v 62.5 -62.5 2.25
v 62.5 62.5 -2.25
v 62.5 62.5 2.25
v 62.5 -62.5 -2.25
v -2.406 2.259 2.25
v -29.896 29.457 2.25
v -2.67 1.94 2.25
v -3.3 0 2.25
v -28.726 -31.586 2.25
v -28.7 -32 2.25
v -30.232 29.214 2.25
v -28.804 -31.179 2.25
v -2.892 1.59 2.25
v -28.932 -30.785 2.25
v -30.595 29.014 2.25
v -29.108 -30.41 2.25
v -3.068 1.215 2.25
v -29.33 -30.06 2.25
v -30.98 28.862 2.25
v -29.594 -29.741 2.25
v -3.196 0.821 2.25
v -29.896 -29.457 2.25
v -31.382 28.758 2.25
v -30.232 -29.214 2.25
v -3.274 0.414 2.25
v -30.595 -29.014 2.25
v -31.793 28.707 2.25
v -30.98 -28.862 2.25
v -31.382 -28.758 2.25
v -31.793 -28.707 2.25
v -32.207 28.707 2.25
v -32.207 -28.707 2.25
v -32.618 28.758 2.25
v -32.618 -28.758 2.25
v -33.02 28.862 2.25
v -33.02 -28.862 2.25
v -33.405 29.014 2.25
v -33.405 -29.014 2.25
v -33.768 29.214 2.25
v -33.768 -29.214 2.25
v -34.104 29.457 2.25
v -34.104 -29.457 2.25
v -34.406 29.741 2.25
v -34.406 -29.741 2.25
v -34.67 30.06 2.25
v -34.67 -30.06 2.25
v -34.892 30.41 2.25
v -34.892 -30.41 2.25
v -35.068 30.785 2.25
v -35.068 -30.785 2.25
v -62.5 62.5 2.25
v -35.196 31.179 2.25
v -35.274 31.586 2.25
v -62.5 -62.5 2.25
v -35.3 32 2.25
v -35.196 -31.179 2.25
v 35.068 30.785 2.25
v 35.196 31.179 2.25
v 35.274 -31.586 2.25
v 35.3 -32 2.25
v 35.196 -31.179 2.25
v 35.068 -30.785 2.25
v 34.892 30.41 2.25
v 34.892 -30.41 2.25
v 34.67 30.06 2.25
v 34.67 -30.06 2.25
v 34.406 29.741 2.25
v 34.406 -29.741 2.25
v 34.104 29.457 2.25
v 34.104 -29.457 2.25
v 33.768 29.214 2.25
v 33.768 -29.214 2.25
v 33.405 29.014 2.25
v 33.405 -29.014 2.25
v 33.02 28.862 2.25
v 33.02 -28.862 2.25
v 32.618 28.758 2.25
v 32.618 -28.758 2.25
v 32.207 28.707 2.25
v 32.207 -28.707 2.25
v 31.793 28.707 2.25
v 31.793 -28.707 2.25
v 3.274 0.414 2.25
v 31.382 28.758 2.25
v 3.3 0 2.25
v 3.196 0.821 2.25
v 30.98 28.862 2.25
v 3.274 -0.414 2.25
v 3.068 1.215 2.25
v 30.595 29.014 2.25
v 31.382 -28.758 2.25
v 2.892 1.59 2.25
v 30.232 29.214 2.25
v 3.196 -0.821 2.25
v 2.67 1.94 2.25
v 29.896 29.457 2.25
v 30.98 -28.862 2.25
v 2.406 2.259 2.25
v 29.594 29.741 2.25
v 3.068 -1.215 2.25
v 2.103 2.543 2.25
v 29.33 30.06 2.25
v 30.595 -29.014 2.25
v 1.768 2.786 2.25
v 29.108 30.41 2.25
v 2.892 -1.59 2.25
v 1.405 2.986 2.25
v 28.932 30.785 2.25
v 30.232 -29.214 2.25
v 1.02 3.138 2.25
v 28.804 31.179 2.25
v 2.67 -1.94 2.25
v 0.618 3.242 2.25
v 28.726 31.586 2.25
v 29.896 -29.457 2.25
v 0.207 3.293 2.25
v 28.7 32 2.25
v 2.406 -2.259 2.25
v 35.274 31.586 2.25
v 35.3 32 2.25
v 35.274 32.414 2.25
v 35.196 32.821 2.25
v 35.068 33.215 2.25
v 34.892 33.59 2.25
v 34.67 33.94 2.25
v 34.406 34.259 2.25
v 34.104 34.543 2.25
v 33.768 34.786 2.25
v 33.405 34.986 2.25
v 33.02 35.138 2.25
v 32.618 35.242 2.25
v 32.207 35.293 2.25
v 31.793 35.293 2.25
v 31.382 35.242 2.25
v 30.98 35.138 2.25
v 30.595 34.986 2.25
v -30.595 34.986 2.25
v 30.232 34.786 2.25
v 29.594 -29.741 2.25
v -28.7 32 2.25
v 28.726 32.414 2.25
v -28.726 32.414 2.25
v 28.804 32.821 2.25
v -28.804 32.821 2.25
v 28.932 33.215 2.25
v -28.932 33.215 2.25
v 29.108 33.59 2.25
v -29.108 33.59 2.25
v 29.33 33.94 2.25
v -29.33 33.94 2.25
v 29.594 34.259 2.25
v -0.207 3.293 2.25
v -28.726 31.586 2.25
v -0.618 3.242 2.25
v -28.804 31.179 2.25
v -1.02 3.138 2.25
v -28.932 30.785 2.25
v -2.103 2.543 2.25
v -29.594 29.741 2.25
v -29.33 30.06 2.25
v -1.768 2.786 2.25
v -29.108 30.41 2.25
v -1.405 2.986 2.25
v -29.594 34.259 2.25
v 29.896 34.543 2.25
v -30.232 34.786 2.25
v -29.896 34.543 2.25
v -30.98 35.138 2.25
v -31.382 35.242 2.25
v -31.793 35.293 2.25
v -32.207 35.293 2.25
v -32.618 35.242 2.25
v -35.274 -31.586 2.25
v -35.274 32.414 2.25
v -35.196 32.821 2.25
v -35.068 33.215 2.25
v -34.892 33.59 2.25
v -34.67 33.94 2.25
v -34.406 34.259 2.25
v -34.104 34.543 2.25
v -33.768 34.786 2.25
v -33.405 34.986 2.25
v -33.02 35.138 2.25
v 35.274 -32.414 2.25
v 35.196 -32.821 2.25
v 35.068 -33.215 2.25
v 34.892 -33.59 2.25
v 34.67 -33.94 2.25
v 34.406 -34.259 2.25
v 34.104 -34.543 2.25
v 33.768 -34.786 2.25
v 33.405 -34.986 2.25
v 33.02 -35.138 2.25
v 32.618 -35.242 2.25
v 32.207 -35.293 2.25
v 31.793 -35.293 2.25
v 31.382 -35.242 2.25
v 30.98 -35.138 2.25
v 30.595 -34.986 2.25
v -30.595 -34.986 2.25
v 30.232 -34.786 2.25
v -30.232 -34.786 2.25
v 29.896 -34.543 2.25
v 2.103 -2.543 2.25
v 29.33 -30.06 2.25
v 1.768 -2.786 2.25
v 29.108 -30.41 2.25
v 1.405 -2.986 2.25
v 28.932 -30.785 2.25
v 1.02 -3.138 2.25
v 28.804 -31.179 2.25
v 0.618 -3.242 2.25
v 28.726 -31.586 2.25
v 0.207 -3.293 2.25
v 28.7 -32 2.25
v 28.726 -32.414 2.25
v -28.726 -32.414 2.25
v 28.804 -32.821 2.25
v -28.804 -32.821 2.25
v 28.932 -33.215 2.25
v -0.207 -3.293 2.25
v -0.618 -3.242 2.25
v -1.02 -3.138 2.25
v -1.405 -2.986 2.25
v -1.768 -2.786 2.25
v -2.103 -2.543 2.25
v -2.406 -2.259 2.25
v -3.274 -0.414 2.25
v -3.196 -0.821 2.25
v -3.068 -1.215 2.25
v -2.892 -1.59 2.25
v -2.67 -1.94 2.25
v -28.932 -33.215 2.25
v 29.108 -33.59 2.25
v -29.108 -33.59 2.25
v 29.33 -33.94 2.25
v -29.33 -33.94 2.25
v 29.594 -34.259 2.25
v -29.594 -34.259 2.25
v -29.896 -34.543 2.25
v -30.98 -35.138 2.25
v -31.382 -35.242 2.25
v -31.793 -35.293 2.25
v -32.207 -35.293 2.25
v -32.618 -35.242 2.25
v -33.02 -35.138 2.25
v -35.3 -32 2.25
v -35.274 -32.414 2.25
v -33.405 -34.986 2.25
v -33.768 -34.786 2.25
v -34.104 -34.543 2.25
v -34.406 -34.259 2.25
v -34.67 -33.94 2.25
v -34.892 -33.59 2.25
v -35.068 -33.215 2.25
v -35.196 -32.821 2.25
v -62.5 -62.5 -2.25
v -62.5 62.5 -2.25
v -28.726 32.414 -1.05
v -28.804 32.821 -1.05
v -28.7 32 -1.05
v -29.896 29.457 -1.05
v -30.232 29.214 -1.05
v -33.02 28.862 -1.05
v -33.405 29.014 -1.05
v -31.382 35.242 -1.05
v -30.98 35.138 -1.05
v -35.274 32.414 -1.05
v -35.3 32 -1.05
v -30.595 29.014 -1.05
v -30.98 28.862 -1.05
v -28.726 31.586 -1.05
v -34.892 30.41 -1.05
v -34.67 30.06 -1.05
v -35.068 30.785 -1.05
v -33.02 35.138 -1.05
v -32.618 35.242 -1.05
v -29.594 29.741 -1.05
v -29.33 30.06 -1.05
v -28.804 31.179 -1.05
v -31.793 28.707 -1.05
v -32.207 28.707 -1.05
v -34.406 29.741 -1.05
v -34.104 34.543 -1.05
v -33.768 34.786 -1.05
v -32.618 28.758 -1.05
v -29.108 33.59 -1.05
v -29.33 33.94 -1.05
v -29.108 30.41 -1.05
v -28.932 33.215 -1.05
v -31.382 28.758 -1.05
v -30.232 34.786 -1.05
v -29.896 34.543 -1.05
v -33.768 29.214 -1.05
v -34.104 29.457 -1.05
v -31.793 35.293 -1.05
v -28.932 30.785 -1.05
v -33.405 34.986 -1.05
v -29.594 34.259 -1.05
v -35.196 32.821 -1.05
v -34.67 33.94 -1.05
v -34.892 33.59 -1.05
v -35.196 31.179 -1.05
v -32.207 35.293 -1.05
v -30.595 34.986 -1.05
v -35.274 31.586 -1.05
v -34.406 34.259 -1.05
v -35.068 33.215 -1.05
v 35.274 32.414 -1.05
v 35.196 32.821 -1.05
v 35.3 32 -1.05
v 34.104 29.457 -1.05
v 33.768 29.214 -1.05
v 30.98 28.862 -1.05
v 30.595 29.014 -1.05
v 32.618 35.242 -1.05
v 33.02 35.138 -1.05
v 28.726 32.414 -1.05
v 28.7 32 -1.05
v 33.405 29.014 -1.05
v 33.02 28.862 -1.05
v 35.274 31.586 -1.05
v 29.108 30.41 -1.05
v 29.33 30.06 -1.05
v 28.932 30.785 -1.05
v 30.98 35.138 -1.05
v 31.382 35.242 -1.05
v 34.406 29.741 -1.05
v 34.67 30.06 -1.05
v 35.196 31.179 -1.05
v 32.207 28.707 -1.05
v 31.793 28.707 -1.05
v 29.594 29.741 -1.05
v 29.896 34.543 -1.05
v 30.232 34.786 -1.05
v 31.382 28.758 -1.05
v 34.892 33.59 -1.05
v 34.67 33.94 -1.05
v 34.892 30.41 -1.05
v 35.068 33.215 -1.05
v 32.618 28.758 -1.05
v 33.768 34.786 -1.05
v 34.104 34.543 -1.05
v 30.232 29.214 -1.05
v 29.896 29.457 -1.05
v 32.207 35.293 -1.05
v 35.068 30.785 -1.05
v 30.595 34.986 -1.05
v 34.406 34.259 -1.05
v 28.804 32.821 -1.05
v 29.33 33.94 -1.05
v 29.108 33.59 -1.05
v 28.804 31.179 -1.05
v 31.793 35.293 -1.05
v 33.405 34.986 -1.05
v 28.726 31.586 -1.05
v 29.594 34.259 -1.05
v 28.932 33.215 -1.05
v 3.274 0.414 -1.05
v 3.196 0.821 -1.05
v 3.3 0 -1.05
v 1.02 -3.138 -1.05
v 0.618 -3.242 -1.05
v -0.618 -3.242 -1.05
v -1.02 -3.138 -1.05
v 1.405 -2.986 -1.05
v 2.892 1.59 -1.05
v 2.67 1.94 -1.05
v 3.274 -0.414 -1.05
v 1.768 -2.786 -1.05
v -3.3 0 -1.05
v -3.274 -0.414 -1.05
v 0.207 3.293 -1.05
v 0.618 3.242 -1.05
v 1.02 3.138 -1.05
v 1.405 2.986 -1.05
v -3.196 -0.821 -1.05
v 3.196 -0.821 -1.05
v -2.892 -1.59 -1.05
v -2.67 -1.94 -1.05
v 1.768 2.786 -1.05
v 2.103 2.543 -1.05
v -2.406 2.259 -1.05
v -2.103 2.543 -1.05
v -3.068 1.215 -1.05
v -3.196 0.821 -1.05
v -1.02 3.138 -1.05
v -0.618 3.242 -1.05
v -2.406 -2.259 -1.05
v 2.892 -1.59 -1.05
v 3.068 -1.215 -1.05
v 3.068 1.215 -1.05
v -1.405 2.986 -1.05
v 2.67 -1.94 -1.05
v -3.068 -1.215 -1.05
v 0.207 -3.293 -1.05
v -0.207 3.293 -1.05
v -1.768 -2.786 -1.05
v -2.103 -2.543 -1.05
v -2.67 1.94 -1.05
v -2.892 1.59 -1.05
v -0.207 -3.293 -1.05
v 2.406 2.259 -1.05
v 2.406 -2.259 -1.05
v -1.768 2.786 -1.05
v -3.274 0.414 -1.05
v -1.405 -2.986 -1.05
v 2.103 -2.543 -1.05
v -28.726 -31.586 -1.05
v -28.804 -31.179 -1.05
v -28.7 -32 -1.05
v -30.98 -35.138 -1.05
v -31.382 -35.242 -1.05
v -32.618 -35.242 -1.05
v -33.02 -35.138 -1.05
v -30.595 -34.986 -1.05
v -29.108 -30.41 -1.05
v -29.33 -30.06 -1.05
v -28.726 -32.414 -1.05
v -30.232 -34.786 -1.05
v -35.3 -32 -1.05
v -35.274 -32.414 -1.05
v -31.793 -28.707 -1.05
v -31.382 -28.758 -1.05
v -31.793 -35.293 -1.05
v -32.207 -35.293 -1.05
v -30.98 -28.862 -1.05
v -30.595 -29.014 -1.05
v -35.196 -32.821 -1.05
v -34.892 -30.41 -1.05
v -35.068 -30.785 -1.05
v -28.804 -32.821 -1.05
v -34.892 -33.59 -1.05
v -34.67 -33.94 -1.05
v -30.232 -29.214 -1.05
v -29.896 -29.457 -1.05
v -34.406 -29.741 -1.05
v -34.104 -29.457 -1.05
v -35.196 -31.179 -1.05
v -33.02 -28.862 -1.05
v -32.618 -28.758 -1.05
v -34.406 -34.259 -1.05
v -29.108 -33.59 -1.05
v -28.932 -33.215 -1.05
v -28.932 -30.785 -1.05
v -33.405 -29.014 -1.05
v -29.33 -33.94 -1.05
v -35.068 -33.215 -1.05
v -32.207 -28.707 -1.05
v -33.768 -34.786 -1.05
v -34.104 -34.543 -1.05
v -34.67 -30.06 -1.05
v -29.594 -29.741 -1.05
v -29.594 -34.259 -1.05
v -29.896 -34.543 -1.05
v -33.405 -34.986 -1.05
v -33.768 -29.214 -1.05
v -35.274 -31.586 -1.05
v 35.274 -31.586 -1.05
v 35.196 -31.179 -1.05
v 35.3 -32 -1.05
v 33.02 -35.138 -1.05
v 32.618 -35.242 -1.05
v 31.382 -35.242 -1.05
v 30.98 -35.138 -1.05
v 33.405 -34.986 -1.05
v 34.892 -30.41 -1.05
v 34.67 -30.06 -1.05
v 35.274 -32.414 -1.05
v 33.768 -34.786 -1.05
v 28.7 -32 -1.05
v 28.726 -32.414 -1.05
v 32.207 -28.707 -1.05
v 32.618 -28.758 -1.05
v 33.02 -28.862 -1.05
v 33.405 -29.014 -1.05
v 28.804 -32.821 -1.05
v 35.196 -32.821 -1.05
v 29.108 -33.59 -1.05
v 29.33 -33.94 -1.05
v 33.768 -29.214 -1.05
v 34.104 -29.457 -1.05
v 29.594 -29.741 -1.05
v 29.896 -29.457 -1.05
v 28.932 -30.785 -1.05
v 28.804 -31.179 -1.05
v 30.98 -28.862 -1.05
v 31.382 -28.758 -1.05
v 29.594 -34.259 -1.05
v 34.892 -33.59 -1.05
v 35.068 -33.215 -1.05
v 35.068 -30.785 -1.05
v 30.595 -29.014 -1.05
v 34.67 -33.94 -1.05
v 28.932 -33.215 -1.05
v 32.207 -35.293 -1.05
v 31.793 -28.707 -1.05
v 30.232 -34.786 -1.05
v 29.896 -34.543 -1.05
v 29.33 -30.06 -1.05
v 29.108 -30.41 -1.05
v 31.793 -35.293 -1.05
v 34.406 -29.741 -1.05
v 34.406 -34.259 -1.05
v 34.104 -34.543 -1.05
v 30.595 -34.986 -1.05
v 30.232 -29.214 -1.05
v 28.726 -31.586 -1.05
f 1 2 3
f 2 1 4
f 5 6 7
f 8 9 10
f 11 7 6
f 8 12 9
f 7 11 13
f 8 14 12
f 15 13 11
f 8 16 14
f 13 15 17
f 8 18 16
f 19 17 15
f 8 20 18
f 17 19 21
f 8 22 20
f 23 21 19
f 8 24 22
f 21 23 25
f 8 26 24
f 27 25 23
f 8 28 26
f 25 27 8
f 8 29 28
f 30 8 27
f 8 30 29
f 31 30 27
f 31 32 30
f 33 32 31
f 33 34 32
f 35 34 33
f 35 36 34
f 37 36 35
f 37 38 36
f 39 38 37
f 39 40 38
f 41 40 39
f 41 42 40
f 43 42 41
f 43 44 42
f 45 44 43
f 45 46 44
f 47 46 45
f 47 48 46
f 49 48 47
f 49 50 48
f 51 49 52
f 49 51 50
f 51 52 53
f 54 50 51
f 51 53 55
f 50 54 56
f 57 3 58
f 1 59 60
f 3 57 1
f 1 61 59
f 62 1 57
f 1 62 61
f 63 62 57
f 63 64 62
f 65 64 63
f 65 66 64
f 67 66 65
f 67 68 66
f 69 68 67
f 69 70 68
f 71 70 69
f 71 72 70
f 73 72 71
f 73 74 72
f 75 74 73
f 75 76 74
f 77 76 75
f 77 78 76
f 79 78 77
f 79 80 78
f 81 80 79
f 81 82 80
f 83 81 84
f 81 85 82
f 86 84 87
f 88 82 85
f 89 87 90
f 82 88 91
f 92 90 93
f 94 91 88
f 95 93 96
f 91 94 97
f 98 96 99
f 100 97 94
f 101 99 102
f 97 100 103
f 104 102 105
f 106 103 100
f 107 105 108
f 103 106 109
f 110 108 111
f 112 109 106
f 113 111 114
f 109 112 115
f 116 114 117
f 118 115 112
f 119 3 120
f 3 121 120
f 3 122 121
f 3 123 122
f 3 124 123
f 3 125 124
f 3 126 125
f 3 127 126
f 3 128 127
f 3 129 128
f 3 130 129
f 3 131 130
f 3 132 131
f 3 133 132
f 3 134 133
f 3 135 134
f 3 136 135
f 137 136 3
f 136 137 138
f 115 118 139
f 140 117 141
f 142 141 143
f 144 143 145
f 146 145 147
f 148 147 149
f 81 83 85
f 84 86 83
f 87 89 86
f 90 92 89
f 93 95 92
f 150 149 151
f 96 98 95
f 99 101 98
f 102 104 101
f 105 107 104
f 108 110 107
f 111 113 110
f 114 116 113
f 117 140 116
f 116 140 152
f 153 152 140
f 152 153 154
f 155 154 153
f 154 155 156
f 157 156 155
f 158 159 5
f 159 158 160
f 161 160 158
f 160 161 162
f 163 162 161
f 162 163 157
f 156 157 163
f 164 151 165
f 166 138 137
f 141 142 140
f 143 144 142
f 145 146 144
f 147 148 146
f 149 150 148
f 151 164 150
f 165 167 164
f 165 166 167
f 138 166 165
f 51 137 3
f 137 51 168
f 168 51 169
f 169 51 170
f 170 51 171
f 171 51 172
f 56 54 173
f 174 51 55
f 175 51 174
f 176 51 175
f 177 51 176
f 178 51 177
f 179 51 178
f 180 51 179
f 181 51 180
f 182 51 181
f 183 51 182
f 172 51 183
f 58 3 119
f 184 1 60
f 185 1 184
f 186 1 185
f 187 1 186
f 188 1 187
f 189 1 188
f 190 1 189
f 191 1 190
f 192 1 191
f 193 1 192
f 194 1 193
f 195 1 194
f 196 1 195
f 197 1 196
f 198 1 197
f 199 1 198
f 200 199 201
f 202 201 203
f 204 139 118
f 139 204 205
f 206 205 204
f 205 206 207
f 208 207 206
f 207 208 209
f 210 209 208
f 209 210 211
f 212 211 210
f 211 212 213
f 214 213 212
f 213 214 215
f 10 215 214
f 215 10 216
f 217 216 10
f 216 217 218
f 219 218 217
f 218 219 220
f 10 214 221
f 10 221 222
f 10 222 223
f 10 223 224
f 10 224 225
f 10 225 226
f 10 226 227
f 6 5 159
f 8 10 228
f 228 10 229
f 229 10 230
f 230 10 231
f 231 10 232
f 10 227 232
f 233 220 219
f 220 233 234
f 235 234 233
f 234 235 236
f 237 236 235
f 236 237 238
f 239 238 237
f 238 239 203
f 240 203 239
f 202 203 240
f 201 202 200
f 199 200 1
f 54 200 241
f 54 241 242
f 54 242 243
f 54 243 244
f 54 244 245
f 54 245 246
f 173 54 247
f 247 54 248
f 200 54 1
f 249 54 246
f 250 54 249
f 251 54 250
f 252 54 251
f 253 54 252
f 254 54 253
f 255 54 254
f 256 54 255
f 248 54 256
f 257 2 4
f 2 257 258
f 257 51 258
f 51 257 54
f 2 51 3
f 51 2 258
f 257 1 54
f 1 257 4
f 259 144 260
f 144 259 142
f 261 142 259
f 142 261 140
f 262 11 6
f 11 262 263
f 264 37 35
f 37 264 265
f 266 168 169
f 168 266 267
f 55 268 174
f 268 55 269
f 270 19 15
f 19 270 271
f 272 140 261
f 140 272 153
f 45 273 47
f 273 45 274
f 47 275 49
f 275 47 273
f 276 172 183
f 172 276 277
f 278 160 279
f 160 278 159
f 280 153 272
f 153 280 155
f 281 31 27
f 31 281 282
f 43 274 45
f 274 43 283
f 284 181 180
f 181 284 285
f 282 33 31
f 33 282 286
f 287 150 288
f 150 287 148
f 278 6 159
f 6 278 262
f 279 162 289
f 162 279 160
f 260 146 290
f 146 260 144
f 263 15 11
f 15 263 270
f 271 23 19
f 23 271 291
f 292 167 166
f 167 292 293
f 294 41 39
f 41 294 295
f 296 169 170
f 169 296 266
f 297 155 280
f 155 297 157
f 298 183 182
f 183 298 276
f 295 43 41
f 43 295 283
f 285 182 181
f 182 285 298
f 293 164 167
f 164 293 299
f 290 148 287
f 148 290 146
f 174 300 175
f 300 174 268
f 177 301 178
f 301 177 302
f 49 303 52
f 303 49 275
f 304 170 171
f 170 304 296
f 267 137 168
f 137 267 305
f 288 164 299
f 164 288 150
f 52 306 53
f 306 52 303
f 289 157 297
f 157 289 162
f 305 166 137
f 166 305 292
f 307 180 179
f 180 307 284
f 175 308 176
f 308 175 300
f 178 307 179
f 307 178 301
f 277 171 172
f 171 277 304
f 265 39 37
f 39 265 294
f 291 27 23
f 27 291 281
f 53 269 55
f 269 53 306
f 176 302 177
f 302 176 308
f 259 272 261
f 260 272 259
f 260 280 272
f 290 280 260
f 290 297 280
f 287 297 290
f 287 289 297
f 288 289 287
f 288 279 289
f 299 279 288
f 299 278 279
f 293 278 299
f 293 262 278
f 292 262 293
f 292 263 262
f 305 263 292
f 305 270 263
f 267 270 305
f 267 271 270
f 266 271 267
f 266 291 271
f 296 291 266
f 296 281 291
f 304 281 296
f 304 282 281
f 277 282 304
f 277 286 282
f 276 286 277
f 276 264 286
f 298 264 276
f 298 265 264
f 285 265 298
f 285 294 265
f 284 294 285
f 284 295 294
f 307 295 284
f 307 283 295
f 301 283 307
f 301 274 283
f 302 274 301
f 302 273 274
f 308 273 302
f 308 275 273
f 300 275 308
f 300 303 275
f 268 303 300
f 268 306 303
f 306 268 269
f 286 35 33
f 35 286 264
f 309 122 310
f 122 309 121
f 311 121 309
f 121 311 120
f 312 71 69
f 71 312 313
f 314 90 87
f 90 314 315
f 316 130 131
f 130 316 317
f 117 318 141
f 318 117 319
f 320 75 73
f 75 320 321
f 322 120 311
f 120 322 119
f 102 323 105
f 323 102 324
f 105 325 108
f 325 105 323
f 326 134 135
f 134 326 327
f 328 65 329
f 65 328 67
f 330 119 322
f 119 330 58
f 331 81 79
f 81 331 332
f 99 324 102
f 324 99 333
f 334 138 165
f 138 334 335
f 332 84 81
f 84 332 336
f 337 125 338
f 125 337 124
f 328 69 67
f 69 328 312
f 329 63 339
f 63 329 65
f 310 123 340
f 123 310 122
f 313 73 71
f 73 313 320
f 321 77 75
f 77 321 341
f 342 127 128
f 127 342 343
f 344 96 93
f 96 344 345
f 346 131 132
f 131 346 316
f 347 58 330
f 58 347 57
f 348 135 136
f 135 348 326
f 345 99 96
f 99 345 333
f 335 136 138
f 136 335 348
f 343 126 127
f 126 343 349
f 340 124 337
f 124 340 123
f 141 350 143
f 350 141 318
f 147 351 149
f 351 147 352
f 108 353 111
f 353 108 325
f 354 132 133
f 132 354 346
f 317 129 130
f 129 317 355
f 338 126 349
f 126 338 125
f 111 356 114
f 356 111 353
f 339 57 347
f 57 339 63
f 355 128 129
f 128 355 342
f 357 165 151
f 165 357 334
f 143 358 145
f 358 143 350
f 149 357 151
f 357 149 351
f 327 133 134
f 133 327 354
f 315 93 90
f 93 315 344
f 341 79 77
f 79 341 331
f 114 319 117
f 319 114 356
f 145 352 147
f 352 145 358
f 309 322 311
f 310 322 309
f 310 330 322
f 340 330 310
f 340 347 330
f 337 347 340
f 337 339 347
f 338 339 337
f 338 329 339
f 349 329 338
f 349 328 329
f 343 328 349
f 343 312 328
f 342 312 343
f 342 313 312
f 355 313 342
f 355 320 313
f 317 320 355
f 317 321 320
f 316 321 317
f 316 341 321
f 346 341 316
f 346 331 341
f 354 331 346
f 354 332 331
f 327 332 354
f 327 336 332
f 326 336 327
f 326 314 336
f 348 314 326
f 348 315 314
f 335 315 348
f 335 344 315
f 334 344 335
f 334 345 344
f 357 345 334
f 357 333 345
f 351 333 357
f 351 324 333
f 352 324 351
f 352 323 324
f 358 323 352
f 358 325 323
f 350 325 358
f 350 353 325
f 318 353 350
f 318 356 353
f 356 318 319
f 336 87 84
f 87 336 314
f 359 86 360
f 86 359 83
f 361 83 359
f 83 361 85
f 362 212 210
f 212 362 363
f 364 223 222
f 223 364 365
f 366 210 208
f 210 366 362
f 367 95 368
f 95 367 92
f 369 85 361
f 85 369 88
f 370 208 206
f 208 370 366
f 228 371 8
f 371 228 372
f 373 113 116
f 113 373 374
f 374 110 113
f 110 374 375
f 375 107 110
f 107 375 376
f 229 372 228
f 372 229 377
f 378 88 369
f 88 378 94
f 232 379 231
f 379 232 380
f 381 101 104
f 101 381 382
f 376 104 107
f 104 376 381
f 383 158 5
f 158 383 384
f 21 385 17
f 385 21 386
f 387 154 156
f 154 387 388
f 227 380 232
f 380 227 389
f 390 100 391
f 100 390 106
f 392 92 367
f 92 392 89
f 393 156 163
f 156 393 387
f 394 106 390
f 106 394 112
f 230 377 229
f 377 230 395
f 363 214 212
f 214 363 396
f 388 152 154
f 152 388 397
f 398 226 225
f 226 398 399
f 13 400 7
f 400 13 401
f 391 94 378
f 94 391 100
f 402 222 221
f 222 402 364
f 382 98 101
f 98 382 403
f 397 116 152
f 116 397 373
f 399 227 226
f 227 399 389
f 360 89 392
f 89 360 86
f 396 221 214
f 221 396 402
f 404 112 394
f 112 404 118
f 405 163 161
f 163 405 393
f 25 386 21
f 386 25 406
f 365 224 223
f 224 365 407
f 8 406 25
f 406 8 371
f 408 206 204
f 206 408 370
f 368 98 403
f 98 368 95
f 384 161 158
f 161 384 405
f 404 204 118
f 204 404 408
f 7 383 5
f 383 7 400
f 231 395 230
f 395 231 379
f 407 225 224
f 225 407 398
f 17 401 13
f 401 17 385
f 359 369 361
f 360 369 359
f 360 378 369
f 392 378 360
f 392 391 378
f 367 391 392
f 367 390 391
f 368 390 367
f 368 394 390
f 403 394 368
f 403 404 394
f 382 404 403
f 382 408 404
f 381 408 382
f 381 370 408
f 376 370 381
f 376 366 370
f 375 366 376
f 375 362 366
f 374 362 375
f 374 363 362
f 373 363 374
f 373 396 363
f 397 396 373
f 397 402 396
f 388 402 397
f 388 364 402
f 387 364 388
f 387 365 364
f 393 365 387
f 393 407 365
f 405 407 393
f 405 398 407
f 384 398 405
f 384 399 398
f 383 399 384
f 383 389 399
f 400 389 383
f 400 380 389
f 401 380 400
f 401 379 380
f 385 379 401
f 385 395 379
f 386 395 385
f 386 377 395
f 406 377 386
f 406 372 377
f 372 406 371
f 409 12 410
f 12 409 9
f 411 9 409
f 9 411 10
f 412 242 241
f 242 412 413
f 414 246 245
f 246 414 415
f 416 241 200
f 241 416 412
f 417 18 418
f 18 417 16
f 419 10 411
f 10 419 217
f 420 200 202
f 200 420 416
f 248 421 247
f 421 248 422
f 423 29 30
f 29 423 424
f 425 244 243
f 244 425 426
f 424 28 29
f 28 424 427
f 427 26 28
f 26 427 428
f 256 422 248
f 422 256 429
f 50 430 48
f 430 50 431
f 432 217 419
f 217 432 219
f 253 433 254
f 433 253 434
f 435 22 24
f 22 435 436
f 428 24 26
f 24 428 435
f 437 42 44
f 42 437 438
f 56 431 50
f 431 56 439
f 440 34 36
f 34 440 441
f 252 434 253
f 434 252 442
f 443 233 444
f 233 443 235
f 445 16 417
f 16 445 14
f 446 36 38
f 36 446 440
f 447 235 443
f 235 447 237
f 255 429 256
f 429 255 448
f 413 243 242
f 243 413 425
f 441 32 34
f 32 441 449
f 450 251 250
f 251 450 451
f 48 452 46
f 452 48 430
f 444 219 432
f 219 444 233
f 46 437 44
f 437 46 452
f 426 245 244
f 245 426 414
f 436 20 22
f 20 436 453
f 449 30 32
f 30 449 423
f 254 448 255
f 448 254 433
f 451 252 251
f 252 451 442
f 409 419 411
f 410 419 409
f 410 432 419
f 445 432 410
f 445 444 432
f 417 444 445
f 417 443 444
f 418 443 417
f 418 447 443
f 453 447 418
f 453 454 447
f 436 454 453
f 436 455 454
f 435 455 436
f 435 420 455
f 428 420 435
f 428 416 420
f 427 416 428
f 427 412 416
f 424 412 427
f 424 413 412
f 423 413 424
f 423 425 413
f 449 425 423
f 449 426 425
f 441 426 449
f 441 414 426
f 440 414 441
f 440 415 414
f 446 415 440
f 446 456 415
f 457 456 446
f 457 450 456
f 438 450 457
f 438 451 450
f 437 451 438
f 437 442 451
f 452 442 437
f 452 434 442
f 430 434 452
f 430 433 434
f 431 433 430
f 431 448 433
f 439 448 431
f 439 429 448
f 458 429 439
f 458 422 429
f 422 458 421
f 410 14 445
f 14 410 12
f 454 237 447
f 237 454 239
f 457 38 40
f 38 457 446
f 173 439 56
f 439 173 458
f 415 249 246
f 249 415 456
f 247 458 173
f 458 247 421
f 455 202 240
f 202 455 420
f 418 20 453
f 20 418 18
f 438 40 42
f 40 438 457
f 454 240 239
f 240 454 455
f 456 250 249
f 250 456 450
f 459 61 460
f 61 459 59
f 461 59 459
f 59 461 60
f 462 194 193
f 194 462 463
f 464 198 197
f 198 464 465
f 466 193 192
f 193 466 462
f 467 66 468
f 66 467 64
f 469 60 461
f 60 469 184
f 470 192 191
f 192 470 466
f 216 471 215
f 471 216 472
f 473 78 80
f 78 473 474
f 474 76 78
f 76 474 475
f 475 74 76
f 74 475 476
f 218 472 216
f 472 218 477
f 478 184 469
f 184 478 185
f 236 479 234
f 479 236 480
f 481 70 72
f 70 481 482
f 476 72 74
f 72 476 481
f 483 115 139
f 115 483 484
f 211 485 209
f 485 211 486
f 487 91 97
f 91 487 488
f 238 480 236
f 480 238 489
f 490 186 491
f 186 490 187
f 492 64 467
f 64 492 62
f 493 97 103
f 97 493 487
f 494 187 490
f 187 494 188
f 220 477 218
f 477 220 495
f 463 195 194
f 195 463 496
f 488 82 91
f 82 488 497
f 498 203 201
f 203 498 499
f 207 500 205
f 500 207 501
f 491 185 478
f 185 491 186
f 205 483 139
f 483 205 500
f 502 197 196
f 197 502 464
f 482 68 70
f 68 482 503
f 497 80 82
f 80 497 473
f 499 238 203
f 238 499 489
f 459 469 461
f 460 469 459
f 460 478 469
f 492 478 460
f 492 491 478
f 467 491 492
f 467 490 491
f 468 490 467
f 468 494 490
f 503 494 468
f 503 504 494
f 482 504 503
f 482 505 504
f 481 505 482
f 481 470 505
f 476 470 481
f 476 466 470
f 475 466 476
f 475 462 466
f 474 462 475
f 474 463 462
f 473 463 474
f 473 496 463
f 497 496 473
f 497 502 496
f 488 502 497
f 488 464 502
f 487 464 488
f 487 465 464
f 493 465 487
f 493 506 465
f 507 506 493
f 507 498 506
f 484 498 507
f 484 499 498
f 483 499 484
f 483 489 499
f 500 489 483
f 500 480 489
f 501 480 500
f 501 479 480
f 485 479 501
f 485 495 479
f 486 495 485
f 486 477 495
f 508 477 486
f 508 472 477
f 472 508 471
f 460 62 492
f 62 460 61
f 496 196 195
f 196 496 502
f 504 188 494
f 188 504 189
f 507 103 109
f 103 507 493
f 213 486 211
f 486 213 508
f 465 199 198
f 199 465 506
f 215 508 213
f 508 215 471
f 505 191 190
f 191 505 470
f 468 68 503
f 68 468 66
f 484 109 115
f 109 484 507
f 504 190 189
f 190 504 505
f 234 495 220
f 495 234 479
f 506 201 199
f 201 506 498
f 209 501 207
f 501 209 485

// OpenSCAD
inset_x = 125;
inset_y = 125;
inset_z = 4.5;

outer_x = 128;
outer_y = 128;

hole_r = 3.3;
hole_depth = -1.05;
hole_z = 4;
$fn=50;

difference() {
    cube([inset_x, inset_y, inset_z], center = true);

    /* Top left */
    translate([-(outer_x / 4), (outer_y / 4), hole_depth])
    {
        cylinder(hole_z, hole_r, hole_r, false);
    }
    
    /* Top right */
    translate([(outer_x / 4), (outer_y / 4), hole_depth])
    {
        cylinder(hole_z, hole_r, hole_r, false);
    }
    
    /* Middle */
    translate([0, 0, hole_depth])
    {
        cylinder(hole_z, hole_r, hole_r, false);
    }
    
    /* Bottom left */
    translate([-(outer_x / 4), -(outer_y / 4), hole_depth])
    {
        cylinder(hole_z, hole_r, hole_r, false);
    }
    
    /* Bottom right */
    translate([(outer_x / 4), -(outer_y / 4), hole_depth])
    {
        cylinder(hole_z, hole_r, hole_r, false);
    }
}
